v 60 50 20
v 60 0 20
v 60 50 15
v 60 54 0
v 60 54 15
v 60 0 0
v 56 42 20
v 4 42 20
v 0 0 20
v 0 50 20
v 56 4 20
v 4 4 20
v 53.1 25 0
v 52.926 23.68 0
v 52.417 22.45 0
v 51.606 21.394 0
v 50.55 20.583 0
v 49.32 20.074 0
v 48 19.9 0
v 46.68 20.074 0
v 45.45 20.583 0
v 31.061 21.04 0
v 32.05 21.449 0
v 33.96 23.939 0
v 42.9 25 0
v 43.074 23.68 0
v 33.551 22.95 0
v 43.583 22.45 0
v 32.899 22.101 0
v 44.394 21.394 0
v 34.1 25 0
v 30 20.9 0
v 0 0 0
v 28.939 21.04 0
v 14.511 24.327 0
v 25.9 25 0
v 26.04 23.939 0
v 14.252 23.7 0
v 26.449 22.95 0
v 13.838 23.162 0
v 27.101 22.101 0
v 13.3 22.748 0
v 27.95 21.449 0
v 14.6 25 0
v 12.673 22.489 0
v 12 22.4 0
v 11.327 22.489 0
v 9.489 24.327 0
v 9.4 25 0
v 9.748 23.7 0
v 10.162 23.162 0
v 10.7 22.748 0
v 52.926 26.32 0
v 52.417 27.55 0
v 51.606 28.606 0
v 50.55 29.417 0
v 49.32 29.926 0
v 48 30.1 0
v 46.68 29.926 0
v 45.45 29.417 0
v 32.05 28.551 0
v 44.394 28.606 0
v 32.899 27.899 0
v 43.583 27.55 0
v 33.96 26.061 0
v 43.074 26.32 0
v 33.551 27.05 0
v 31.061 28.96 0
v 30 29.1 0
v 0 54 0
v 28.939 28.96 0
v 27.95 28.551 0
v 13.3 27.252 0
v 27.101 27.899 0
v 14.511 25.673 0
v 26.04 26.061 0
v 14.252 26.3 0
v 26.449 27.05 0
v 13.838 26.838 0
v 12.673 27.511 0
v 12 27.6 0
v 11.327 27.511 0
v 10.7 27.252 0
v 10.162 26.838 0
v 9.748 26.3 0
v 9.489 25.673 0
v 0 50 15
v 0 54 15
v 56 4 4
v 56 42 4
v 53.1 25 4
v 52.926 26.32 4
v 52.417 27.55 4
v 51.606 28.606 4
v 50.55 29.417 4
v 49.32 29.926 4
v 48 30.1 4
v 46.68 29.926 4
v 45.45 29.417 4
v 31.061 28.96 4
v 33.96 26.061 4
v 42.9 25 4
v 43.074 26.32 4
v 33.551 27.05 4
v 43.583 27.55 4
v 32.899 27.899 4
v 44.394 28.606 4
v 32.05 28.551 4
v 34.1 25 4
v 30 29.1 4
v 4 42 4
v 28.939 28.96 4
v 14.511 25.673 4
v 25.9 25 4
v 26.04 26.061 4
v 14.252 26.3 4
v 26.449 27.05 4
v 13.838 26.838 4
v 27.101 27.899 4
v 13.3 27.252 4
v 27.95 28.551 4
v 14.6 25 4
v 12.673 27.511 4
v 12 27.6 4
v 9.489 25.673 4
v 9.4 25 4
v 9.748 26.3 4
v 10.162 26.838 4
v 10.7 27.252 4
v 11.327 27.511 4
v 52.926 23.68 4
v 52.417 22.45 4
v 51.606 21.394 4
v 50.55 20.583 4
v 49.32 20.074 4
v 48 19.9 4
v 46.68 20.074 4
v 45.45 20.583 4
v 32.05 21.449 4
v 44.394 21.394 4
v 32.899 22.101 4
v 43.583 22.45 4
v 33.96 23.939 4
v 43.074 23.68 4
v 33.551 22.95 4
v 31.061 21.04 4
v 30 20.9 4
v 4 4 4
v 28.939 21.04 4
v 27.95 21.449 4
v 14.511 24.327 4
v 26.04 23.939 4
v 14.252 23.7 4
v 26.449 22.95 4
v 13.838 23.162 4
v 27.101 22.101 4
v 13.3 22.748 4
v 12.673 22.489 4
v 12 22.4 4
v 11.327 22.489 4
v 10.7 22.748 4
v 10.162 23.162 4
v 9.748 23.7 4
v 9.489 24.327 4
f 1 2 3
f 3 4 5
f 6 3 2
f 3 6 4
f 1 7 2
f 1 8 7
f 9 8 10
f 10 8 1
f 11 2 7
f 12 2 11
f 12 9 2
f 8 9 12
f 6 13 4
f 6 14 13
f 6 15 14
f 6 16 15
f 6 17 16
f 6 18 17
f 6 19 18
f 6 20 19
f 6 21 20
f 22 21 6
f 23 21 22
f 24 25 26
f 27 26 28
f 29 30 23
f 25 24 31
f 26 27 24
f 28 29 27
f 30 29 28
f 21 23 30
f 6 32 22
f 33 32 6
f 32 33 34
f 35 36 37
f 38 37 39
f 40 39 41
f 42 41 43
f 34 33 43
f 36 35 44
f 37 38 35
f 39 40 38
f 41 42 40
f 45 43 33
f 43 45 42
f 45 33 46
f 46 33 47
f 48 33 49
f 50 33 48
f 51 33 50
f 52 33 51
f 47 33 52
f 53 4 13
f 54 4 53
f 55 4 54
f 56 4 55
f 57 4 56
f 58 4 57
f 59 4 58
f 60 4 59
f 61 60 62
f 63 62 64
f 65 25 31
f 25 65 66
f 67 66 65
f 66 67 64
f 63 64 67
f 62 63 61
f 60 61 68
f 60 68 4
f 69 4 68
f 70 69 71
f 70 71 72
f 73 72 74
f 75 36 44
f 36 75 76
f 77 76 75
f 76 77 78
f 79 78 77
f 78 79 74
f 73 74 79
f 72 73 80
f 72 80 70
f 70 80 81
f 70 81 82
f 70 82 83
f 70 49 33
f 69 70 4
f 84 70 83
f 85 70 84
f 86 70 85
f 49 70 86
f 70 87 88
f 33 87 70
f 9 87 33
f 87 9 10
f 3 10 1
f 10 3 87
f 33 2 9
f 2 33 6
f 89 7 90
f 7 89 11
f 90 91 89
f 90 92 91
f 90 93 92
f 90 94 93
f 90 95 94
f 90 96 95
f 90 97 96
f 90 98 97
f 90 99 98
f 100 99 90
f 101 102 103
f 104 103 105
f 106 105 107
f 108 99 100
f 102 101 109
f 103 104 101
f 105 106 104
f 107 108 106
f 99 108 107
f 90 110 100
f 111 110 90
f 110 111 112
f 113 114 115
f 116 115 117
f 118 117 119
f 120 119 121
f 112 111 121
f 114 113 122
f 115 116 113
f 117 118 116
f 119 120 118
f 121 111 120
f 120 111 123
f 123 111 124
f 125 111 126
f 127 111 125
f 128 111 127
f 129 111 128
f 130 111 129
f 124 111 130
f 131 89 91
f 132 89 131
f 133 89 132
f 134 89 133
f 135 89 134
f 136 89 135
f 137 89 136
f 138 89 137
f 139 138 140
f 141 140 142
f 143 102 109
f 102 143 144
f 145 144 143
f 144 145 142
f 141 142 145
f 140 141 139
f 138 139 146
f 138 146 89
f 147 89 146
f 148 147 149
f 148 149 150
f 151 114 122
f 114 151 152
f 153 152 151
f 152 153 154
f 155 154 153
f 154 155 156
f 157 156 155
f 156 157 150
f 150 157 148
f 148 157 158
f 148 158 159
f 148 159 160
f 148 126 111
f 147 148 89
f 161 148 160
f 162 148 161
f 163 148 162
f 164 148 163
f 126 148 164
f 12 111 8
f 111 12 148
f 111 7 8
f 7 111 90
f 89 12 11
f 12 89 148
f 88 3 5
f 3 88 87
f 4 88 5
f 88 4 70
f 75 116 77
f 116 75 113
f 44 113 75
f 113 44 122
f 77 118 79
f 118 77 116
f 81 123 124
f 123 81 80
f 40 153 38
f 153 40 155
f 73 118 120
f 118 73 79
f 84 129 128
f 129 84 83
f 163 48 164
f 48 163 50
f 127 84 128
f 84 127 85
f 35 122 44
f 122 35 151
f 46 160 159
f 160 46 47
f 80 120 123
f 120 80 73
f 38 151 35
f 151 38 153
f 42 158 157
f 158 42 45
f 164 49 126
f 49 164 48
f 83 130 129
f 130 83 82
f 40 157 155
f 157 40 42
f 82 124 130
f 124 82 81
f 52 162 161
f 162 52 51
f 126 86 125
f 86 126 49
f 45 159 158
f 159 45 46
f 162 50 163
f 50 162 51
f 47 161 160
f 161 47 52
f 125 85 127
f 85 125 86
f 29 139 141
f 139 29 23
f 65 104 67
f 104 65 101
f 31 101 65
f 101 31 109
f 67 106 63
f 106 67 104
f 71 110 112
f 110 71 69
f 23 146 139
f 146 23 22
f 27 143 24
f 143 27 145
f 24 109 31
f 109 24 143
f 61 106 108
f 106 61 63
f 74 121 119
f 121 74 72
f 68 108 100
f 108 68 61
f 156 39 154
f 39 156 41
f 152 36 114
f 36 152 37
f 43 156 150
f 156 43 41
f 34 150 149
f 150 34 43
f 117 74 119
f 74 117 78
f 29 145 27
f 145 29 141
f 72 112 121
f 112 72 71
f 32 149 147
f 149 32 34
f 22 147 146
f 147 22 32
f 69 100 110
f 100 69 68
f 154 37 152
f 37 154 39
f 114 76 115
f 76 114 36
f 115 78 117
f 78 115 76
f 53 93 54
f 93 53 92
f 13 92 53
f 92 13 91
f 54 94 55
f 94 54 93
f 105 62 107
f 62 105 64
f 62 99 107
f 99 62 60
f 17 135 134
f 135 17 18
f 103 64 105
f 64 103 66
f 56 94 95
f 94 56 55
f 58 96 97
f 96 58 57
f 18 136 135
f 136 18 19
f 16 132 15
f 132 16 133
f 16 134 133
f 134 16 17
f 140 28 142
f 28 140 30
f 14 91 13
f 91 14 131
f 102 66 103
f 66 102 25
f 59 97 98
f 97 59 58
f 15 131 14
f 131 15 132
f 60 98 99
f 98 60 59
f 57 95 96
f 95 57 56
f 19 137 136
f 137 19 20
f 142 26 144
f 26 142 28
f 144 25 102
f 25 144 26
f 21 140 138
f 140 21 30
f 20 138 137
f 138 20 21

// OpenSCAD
// ============================================================
// Parametric Jig / Drill Guide
// ============================================================
// Drilling guide for consistent hole placement.
// Clamps or presses against workpiece edge.

// ---- PARAMETERS ----
jig_w        = 60;    // Jig body width (mm)
jig_d        = 50;    // Jig body depth (mm)
jig_h        = 20;    // Jig body height (mm)
wall         = 4;     // Wall thickness

// Guide holes
hole_dia     = [5, 8, 10];   // Drill guide diameters (mm) — one column per size
hole_spacing = 18;           // Spacing between guide hole columns (mm)
hole_y       = 25;           // Y-position of guide holes (depth into workpiece)

// Fence (edge registration)
fence_h      = 15;    // Height of fence that registers against workpiece edge
fence_t      = 4;     // Fence thickness
fence_l      = jig_w; // Fence length

// ---- JIG BODY ----
module jig_body() {
    difference() {
        cube([jig_w, jig_d, jig_h]);
        // Remove material inside (weight saving, not structural)
        translate([wall, wall, wall])
            cube([jig_w - wall*2, jig_d - wall*2 - fence_t, jig_h]);
    }
}

// ---- GUIDE BUSHINGS ----
module guide_holes() {
    start_x = (jig_w - (len(hole_dia) - 1) * hole_spacing) / 2;
    for (i = [0 : len(hole_dia) - 1]) {
        x = start_x + i * hole_spacing;
        translate([x, hole_y, -0.1]) {
            // Guide hole through jig
            cylinder(d=hole_dia[i] + 0.2, h=jig_h + 0.2, $fn=24);
            // Chamfer entry
            translate([0, 0, jig_h - 1])
                cylinder(d1=hole_dia[i] + 0.2, d2=hole_dia[i] + 3, h=2, $fn=24);
        }
    }
}

// ---- FENCE ----
module fence() {
    translate([0, jig_d, 0])
        cube([fence_l, fence_t, fence_h]);
}

// ---- ASSEMBLE ----
difference() {
    union() {
        jig_body();
        fence();
    }
    guide_holes();
}

// ---- LABELS (echo to console) ----
for (i = [0 : len(hole_dia) - 1])
    echo(str("Guide ", i+1, ": ", hole_dia[i], "mm dia @ X=", (jig_w - (len(hole_dia)-1)*hole_spacing)/2 + i*hole_spacing, "mm"));
